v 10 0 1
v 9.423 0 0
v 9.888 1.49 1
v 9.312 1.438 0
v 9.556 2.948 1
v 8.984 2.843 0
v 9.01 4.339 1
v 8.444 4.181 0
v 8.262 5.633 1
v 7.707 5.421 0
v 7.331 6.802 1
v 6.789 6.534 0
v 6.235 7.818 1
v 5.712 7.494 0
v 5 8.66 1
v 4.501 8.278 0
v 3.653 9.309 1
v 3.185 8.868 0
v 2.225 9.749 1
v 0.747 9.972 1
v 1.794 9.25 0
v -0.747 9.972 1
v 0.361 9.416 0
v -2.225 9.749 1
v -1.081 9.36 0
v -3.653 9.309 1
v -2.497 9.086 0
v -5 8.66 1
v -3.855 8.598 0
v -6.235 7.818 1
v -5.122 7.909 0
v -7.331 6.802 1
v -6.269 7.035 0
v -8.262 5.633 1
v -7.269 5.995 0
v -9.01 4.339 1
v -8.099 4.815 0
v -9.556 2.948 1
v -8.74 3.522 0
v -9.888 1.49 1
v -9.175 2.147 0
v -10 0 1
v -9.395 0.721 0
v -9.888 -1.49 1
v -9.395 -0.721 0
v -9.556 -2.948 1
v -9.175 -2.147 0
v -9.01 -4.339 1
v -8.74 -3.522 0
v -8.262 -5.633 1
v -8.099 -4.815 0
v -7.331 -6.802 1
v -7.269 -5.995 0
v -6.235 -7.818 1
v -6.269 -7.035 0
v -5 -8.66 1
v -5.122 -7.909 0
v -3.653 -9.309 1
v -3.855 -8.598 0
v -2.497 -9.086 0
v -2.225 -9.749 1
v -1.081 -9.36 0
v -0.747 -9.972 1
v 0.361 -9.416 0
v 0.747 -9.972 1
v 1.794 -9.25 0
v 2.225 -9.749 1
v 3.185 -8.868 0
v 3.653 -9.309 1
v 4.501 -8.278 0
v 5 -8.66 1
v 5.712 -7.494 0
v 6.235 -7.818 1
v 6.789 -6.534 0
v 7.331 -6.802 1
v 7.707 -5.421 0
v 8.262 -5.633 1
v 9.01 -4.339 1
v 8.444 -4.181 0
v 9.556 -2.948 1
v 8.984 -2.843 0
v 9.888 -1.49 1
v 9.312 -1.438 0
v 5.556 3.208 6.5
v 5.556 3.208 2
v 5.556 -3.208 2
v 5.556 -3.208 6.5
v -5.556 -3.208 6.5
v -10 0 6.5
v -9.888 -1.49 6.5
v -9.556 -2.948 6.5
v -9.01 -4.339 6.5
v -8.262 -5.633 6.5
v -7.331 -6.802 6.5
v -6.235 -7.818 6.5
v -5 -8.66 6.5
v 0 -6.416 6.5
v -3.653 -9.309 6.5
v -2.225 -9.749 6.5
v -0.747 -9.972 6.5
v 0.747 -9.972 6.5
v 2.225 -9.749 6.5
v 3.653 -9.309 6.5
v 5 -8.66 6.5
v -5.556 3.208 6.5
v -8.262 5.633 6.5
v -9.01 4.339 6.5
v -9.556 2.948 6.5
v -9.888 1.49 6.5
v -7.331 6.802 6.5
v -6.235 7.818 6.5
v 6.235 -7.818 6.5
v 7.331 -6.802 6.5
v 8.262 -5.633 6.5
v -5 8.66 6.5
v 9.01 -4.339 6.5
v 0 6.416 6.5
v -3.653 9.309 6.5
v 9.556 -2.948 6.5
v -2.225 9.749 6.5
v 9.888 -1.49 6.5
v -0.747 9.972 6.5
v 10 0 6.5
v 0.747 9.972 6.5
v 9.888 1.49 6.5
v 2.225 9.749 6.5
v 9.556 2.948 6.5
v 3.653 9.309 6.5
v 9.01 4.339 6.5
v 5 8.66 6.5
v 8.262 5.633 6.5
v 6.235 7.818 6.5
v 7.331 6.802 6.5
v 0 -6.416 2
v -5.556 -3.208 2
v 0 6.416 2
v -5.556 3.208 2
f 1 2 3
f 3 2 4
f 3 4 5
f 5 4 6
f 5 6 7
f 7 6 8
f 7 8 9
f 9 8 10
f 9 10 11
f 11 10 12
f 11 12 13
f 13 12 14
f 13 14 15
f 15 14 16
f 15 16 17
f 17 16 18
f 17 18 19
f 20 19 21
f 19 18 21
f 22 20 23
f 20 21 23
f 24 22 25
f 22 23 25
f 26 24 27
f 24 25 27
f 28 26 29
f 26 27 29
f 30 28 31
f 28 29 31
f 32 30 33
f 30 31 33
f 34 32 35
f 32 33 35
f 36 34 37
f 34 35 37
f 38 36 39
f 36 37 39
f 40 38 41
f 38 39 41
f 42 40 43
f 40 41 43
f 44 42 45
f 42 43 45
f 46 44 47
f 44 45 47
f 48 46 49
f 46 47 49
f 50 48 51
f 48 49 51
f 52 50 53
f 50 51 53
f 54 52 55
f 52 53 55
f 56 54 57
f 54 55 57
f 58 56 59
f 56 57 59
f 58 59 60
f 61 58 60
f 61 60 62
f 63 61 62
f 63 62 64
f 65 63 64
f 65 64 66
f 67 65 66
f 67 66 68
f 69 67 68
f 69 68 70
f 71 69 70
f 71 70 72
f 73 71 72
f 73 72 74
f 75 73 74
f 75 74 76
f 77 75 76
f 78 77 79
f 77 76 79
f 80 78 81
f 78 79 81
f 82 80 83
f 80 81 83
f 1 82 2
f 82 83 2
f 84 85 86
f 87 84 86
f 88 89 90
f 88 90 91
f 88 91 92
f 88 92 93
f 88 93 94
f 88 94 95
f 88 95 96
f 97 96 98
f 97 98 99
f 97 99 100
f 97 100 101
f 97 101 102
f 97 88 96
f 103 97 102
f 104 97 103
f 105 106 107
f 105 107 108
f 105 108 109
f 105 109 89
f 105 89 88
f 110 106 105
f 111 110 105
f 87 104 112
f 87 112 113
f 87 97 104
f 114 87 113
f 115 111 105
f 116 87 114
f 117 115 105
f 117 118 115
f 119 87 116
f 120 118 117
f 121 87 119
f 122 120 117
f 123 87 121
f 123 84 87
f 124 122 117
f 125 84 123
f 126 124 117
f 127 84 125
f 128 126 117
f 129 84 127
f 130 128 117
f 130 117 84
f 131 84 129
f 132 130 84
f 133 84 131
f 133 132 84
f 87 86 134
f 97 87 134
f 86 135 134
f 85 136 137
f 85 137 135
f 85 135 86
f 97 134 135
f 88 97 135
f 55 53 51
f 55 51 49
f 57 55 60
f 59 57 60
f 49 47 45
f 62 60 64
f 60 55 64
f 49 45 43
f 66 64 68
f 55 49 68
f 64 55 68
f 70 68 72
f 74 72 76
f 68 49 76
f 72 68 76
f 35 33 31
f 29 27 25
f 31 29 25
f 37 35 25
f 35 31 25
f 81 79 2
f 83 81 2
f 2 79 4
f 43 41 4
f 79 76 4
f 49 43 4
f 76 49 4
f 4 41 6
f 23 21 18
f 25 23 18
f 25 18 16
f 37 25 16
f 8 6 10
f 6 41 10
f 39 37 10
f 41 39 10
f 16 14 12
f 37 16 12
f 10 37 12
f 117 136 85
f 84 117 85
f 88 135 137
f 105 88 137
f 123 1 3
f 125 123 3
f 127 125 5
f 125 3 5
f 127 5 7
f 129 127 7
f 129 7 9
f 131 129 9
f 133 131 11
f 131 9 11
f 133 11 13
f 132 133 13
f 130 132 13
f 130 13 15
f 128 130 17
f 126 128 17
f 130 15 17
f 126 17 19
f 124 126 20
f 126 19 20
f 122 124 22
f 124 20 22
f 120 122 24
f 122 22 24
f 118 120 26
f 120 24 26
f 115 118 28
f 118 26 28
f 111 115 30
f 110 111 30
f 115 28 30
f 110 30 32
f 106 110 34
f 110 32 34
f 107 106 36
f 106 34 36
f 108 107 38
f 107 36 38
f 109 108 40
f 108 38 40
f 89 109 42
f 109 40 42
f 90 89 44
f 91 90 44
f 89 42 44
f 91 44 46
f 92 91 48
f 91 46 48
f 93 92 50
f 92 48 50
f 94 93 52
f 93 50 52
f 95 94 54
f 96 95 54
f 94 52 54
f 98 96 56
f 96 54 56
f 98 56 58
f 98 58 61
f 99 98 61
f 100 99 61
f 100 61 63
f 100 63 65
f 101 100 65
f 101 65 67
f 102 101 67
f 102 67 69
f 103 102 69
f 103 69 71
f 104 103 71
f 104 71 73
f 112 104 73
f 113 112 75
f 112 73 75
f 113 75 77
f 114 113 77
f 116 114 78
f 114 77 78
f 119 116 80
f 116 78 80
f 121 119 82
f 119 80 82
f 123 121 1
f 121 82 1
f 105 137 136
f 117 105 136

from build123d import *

# Parameters (mm, degrees)
F0_R     = 10
F1_DEPTH = 6.5
F2_DEPTH = 2
F3_SIZE2 = 0.5773502692
F3_SIZE  = 1


with BuildPart() as f1:
    # F0 (on Top) → F1 (new body)
    with BuildSketch(Plane.XY):
        Circle(F0_R)
        Polygon((-5.55625, -3.2079024332), (-5.55625, 3.2079024332), (0, 6.4158048664), (5.55625, 3.2079024332), (5.55625, -3.2079024332), (0, -6.4158048664), align=None, mode=Mode.SUBTRACT)
    extrude(amount=F1_DEPTH)

    # F0 (on Top) → F2 (join)
    with BuildSketch(Plane.XY):
        Polygon((0, 6.4158048664), (-5.55625, 3.2079024332), (-5.55625, -3.2079024332), (0, -6.4158048664), (5.55625, -3.2079024332), (5.55625, 3.2079024332), align=None)
    extrude(amount=F2_DEPTH)

    # F3
    f3_edges = [f1.edges().sort_by_distance(p)[0] for p in [
        (-10, 0, 0),
    ]]
    f3_side = f1.faces().sort_by_distance((-10, 0, 3.25))[0]
    chamfer(f3_edges, length=F3_SIZE, length2=F3_SIZE2, reference=f3_side)


solid = f1.part
